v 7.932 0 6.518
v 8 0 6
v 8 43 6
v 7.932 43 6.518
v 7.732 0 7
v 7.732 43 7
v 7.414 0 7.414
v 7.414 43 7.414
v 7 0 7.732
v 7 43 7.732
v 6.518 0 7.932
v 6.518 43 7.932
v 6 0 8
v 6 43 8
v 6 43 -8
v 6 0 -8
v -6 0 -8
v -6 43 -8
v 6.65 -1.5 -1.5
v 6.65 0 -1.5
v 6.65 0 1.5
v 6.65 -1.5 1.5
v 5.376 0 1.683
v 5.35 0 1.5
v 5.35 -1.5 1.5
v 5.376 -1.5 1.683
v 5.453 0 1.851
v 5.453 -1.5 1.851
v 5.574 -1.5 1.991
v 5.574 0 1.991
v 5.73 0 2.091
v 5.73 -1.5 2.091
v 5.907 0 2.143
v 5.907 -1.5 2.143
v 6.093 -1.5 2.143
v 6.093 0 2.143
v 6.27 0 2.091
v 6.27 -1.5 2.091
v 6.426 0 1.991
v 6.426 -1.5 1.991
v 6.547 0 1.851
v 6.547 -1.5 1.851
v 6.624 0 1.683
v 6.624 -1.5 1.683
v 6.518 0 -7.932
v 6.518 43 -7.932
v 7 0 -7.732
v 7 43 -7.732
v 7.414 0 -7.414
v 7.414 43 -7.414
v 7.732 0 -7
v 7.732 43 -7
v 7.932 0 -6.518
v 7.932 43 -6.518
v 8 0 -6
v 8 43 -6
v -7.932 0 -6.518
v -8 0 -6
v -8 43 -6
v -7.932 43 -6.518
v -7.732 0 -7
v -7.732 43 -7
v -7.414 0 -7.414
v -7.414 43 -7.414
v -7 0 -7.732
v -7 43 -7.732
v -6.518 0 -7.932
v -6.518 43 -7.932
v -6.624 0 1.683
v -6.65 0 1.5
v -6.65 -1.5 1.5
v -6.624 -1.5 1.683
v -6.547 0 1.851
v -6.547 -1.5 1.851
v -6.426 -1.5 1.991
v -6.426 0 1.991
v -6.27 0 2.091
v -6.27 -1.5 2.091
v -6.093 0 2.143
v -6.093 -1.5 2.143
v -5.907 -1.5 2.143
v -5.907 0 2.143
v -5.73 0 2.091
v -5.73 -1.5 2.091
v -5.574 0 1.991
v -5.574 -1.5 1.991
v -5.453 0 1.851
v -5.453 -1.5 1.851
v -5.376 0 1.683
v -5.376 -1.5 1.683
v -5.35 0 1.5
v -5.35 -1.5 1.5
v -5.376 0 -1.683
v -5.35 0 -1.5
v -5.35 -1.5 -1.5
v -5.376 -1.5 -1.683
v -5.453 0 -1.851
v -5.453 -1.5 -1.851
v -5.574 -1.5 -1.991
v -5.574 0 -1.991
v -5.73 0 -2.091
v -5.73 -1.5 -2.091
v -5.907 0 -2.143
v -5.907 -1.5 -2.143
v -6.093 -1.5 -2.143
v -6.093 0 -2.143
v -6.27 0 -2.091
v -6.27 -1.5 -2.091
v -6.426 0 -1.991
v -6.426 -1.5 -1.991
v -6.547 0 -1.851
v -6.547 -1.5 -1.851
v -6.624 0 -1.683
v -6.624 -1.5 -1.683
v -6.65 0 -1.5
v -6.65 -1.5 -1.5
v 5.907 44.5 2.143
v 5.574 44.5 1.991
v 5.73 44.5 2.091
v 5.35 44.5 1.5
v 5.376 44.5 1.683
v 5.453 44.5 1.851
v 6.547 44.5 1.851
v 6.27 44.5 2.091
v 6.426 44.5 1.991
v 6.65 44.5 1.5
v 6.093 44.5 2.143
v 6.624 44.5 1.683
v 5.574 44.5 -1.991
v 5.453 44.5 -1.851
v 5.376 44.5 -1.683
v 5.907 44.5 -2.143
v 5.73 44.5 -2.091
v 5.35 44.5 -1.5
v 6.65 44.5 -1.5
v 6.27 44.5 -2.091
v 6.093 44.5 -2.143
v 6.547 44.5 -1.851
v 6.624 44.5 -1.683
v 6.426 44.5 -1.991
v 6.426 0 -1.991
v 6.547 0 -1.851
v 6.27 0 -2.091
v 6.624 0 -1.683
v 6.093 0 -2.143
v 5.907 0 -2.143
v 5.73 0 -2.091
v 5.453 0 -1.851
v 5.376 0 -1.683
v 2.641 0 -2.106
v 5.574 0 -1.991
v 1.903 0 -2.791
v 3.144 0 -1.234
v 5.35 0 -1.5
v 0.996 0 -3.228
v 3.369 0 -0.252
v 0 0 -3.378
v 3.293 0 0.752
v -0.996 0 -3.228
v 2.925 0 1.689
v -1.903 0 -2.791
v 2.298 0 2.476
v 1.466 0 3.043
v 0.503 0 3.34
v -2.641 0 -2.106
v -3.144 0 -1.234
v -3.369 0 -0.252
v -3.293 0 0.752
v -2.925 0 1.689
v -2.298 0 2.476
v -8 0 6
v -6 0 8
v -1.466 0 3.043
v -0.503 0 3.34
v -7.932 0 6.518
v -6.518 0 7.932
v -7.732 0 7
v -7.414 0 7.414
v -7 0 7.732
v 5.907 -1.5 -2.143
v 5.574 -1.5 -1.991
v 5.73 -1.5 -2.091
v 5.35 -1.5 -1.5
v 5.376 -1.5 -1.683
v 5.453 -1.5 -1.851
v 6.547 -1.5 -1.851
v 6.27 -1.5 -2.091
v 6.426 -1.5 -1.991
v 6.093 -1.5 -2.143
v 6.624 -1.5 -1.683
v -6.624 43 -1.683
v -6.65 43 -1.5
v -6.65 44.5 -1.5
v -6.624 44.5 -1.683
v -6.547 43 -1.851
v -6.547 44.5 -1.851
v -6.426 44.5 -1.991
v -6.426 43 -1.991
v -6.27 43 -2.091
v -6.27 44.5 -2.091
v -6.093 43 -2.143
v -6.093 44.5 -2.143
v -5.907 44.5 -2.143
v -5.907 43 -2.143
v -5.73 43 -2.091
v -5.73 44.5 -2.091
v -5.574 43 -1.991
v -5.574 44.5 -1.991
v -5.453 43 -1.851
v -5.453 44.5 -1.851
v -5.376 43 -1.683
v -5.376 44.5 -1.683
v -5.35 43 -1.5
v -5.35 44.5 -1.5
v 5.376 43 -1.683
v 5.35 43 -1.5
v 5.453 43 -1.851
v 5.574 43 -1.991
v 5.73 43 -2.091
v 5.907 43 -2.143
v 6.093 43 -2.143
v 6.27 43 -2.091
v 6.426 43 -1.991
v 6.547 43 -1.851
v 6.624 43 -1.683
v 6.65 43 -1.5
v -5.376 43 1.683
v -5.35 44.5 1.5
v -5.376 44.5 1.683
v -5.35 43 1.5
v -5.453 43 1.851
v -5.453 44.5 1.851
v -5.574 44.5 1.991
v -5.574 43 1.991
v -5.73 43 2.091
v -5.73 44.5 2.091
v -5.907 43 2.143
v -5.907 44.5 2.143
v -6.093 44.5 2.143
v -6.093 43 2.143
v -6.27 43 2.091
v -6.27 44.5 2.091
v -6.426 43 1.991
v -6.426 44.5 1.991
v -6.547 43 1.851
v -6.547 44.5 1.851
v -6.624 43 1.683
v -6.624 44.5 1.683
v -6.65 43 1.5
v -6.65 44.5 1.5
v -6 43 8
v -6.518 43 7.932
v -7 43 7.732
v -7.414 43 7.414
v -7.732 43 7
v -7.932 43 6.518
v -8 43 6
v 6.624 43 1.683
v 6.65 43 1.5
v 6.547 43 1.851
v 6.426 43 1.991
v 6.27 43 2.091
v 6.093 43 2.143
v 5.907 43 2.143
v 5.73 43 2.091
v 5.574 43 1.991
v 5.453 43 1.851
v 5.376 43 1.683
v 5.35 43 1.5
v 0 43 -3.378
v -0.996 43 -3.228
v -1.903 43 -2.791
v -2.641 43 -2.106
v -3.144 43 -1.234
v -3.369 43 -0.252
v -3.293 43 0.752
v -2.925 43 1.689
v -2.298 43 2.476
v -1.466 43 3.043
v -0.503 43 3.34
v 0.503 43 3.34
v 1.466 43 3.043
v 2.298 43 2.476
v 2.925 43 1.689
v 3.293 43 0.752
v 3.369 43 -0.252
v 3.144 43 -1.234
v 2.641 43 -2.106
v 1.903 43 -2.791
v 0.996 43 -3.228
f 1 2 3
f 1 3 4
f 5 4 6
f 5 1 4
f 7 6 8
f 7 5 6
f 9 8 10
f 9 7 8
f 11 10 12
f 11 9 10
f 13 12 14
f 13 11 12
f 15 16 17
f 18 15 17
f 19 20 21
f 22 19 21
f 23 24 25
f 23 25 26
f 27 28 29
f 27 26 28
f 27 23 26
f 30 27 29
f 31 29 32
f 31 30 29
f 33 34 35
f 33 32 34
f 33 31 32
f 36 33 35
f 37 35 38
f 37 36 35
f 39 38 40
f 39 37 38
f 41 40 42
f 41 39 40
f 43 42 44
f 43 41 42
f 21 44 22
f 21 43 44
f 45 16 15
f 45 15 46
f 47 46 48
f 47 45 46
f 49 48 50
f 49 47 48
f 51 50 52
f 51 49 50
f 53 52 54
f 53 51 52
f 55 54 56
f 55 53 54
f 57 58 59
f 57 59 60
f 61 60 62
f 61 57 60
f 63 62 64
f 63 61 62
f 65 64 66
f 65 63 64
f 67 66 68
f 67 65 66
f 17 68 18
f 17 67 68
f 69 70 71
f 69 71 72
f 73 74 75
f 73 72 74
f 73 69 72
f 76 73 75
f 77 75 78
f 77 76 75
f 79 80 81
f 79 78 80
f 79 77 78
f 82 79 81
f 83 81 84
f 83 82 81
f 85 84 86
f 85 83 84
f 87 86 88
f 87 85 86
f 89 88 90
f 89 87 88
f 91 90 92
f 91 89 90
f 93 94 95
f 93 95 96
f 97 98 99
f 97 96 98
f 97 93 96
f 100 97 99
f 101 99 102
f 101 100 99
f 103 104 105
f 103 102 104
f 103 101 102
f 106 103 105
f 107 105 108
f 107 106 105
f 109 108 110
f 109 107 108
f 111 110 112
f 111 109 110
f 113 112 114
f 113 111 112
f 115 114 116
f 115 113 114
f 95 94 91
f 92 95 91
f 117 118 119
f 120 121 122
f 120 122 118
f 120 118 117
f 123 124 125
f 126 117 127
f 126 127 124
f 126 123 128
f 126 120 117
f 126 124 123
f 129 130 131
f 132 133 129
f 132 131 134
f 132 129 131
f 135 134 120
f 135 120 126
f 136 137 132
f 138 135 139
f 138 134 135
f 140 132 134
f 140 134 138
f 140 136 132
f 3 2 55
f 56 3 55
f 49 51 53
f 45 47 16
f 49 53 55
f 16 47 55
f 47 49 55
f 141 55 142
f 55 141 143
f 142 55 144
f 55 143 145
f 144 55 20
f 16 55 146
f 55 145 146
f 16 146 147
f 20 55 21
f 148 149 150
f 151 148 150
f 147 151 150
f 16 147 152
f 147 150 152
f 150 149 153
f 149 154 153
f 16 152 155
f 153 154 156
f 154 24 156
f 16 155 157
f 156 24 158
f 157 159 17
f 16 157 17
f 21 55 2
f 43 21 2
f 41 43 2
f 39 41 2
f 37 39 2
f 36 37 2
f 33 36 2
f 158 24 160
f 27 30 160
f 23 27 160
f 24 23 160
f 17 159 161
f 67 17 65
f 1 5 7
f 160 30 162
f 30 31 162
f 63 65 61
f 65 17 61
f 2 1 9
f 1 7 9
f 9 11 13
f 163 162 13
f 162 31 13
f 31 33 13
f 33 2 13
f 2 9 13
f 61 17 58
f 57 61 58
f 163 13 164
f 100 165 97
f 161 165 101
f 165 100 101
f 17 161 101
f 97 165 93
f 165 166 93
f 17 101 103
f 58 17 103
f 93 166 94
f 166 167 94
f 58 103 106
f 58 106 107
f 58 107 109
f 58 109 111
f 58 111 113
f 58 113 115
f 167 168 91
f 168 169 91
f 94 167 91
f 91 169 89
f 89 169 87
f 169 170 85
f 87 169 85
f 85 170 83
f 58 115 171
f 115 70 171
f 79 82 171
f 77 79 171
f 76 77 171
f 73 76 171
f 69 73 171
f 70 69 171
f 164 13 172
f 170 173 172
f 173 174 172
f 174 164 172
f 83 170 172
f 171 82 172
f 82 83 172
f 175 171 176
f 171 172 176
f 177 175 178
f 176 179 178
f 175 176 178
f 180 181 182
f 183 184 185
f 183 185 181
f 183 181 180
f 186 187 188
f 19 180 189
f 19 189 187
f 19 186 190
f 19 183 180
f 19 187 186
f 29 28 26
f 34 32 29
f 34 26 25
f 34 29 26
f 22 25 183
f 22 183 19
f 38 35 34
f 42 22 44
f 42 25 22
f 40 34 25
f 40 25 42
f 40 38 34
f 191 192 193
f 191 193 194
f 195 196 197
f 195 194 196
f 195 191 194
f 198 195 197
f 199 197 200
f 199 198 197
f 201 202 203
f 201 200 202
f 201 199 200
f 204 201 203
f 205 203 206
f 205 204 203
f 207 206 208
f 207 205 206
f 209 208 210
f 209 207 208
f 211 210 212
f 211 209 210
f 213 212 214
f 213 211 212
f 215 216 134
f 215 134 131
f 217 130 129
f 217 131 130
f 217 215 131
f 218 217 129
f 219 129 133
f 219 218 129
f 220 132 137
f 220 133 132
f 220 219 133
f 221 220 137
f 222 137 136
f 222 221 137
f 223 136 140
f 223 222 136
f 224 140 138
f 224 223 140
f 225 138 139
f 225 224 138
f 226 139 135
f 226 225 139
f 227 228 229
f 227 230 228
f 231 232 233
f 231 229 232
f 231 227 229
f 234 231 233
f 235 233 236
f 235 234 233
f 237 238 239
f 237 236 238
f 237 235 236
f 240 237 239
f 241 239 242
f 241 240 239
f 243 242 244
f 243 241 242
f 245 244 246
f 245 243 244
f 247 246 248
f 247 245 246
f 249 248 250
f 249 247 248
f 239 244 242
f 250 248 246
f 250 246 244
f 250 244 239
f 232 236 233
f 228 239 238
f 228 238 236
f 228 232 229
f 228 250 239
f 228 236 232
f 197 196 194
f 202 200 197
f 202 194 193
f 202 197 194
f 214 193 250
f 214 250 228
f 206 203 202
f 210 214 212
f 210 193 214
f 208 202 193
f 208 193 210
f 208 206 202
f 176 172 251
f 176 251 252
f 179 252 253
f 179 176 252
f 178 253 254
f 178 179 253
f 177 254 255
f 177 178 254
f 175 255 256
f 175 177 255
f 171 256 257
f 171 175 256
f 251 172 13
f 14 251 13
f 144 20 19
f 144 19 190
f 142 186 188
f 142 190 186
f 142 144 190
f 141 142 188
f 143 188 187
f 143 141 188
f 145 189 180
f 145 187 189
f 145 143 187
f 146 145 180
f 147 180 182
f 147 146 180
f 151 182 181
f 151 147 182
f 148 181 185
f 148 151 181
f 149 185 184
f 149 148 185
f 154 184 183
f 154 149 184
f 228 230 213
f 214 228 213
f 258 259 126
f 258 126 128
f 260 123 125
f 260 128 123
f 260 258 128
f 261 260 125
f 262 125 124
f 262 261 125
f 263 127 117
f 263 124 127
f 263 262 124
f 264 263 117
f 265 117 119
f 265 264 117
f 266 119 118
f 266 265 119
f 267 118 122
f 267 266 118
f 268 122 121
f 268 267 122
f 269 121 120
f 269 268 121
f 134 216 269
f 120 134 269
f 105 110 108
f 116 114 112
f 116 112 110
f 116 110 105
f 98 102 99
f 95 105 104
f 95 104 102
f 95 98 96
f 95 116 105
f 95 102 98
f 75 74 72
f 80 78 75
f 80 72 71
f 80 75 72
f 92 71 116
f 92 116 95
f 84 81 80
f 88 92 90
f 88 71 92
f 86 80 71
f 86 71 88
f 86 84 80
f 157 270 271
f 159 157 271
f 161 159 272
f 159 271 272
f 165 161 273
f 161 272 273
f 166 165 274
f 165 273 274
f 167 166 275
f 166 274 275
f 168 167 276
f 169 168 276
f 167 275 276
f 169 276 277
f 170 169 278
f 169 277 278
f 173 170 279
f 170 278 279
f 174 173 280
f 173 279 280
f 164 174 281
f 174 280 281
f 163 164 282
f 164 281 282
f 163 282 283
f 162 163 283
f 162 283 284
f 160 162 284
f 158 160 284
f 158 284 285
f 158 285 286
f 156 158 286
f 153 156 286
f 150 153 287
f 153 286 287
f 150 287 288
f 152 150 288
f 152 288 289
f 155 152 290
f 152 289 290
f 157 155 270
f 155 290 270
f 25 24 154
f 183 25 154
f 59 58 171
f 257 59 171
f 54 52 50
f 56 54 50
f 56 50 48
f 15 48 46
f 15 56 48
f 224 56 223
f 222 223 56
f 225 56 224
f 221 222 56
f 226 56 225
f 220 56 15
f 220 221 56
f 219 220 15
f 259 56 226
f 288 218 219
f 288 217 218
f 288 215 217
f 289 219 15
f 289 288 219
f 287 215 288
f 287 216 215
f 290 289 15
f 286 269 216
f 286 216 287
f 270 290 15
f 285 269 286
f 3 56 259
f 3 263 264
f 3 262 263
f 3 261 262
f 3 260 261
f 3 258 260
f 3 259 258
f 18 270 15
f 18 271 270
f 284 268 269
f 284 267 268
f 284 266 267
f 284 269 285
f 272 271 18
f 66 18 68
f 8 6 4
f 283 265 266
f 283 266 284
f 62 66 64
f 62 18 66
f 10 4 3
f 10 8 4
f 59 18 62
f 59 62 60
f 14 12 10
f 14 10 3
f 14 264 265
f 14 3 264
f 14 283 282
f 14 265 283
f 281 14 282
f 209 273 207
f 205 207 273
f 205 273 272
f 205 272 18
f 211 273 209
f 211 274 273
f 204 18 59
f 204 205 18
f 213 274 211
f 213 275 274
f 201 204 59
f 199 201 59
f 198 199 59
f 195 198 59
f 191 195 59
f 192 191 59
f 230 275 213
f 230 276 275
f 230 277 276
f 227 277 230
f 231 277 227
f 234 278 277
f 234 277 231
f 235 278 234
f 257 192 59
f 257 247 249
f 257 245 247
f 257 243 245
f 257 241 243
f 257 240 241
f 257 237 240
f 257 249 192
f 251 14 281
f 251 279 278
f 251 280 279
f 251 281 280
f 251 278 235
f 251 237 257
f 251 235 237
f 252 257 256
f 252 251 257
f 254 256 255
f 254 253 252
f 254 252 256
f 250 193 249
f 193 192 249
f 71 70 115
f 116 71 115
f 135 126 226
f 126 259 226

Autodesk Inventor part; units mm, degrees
ref_plane "YZ Plane" through (0, 0, 0) normal (1, 0, 0) x (0, 1, 0)
ref_plane "XZ Plane" through (0, 0, 0) normal (0, 1, 0) x (-1, 0, 0)
ref_plane "XY Plane" through (0, 0, 0) normal (0, 0, 1) x (1, 0, 0)
sketch "Sketch1" plane through (0, 0, 0) normal (0, 1, 0) x (-1, 0, 0)
  line L0 (6, 8) -> (-6, 8)
  line L1 (-8, 6) -> (-8, -6)
  line L2 (-6, -8) -> (6, -8)
  line L3 (8, -6) -> (8, 6)
  arc A0 (8, 6) -> (6, 8) centre (6, 6) ccw
  arc A1 (-6, 8) -> (-8, 6) centre (-6, 6) ccw
  arc A2 (-8, -6) -> (-6, -8) centre (-6, -6) ccw
  arc A3 (6, -8) -> (8, -6) centre (6, -6) ccw
  point P0 (0, 0)
  point P1 (8, 8)
  point P2 (-8, 8)
  point P3 (8, -8)
  dimension "d0" = 16
  dimension "d1" = 16
  dimension "d2" = 8
  dimension "d3" = 8
  dimension "d4" = 2
extrude "Extrusion1" add sketch "Sketch1" along normal blind 43
sketch "Sketch2" plane through (0, 0, 0) normal (0, -1, 0) x (1, 0, 0)
  point P0 (0, 0)
hole "Hole1" at (0, 0, 0) direction (0, 1, 0) diameter 6.756 end through all clearance for "Flat Head Machine Screw (82)" size "1/4" standard "Ansi Unified Screw Threads"
sketch "Sketch3" plane through (0, 43, 0) normal (0, 1, 0) x (1, 0, 0)
  line L0 (-6, 1.5) -> (-6, -1.5) construction
  line L1 (-6.65, 1.5) -> (-6.65, -1.5)
  line L2 (-5.35, -1.5) -> (-5.35, 1.5)
  arc A0 (-5.35, 1.5) -> (-6.65, 1.5) centre (-6, 1.5) ccw
  arc A1 (-6.65, -1.5) -> (-5.35, -1.5) centre (-6, -1.5) ccw
  line L3 (6, 1.5) -> (6, -1.5) construction
  line L4 (5.35, 1.5) -> (5.35, -1.5)
  line L5 (6.65, -1.5) -> (6.65, 1.5)
  arc A2 (6.65, 1.5) -> (5.35, 1.5) centre (6, 1.5) ccw
  arc A3 (5.35, -1.5) -> (6.65, -1.5) centre (6, -1.5) ccw
  line L6 (-6, 0) -> (6, 0) construction
  line L7 (6, 8) -> (-6, 8) projected
  point P0 (0, 0)
  dimension "d25" = 0.65
  dimension "d26" = 0.65
  dimension "d27" = 3
  dimension "d29" = 0
  dimension "d30" = 12
  dimension "d31" = 6
  dimension "d32" = 3
extrude "Extrusion3" add sketch "Sketch3" along normal blind 1.5
sketch "Sketch4" plane through (0, 0, 0) normal (0, -1, 0) x (1, 0, 0)
  line L0 (-6, 1.5) -> (-6, -1.5) construction
  line L1 (-6.65, 1.5) -> (-6.65, -1.5)
  line L2 (-5.35, -1.5) -> (-5.35, 1.5)
  arc A0 (-5.35, 1.5) -> (-6.65, 1.5) centre (-6, 1.5) ccw
  arc A1 (-6.65, -1.5) -> (-5.35, -1.5) centre (-6, -1.5) ccw
  line L3 (6, 1.5) -> (6, -1.5) construction
  line L4 (5.35, 1.5) -> (5.35, -1.5)
  line L5 (6.65, -1.5) -> (6.65, 1.5)
  arc A2 (6.65, 1.5) -> (5.35, 1.5) centre (6, 1.5) ccw
  arc A3 (5.35, -1.5) -> (6.65, -1.5) centre (6, -1.5) ccw
  line L6 (-6, 0) -> (6, 0) construction
  point P0 (0, 0)
  point P1 (0, 0)
  dimension "d35" = 0.65
  dimension "d36" = 0.65
  dimension "d37" = 3
  dimension "d38" = 0
  dimension "d39" = 12
  dimension "d40" = 6
  dimension "d41" = 3
extrude "Extrusion4" add sketch "Sketch4" along normal blind 1.5
equation "\"d1\" = d0"
equation "\"d2\" = 0.5 * d0"
equation "\"d3\" = d2"
equation "\"d26\" = d25"
equation "\"d27\" = d32"
equation "\"d31\" = 0.5 * d30"
equation "\"d36\" = d35"
equation "\"d37\" = d41"
equation "\"d40\" = 0.5 * d39"
properties part number "Camera Mount 43mm_all"
